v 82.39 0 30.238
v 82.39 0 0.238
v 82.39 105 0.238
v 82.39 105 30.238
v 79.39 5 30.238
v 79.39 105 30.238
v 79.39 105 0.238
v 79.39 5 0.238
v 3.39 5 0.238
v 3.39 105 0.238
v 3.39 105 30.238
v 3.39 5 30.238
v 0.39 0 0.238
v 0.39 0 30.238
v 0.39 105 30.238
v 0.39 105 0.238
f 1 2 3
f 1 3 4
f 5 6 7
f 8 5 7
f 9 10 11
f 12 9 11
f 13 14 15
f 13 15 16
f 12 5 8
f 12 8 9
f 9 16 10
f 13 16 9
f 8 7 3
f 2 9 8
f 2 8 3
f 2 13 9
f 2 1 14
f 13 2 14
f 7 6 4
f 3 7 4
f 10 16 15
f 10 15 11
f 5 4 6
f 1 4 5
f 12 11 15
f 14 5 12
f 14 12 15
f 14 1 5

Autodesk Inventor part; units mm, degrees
ref_plane "YZ Plane" through (0, 0, 0) normal (1, 0, 0) x (0, 1, 0)
ref_plane "XZ Plane" through (0, 0, 0) normal (0, 1, 0) x (-1, 0, 0)
ref_plane "XY Plane" through (0, 0, 0) normal (0, 0, 1) x (1, 0, 0)
sketch "スケッチ1" plane through (0, 0, 0) normal (0, 1, 0) x (-1, 0, 0)
  line L0 (-0.3902, 0.2385) -> (-82.3902, 0.2385)
  line L1 (-82.3902, 0.2385) -> (-82.3902, 30.2385)
  line L2 (-82.3902, 30.2385) -> (-0.3902, 30.2385)
  line L3 (-0.3902, 30.2385) -> (-0.3902, 0.2385)
  point P0 (0, 0)
  dimension "d0" = 82
  dimension "d1" = 30
extrude "押し出し1" add sketch "スケッチ1" along normal blind 5
sketch "スケッチ2" plane through (0, 5, 0) normal (0, 1, 0) x (1, 0, 0)
  line L0 (82.3902, -0.2385) -> (0.3902, -0.2385) projected
  line L1 (0.3902, -30.2385) -> (82.3902, -30.2385) projected
  line L2 (0.3902, -0.2385) -> (3.3902, -0.2385)
  line L3 (3.3902, -0.2385) -> (3.3902, -30.2385)
  line L4 (3.3902, -30.2385) -> (0.3902, -30.2385)
  line L5 (0.3902, -30.2385) -> (0.3902, -0.2385)
  line L6 (82.3902, -30.2385) -> (79.3902, -30.2385)
  line L7 (79.3902, -30.2385) -> (79.3902, -0.2385)
  line L8 (79.3902, -0.2385) -> (82.3902, -0.2385)
  line L9 (82.3902, -0.2385) -> (82.3902, -30.2385)
  point P0 (0, 0)
  dimension "d4" = 3
  dimension "d5" = 3
extrude "押し出し2" add sketch "スケッチ2" along normal blind 100 contours L9 L1 L7 L0 | L3 L1 L5 L0
properties part number "知能ロボコン大砲５"
